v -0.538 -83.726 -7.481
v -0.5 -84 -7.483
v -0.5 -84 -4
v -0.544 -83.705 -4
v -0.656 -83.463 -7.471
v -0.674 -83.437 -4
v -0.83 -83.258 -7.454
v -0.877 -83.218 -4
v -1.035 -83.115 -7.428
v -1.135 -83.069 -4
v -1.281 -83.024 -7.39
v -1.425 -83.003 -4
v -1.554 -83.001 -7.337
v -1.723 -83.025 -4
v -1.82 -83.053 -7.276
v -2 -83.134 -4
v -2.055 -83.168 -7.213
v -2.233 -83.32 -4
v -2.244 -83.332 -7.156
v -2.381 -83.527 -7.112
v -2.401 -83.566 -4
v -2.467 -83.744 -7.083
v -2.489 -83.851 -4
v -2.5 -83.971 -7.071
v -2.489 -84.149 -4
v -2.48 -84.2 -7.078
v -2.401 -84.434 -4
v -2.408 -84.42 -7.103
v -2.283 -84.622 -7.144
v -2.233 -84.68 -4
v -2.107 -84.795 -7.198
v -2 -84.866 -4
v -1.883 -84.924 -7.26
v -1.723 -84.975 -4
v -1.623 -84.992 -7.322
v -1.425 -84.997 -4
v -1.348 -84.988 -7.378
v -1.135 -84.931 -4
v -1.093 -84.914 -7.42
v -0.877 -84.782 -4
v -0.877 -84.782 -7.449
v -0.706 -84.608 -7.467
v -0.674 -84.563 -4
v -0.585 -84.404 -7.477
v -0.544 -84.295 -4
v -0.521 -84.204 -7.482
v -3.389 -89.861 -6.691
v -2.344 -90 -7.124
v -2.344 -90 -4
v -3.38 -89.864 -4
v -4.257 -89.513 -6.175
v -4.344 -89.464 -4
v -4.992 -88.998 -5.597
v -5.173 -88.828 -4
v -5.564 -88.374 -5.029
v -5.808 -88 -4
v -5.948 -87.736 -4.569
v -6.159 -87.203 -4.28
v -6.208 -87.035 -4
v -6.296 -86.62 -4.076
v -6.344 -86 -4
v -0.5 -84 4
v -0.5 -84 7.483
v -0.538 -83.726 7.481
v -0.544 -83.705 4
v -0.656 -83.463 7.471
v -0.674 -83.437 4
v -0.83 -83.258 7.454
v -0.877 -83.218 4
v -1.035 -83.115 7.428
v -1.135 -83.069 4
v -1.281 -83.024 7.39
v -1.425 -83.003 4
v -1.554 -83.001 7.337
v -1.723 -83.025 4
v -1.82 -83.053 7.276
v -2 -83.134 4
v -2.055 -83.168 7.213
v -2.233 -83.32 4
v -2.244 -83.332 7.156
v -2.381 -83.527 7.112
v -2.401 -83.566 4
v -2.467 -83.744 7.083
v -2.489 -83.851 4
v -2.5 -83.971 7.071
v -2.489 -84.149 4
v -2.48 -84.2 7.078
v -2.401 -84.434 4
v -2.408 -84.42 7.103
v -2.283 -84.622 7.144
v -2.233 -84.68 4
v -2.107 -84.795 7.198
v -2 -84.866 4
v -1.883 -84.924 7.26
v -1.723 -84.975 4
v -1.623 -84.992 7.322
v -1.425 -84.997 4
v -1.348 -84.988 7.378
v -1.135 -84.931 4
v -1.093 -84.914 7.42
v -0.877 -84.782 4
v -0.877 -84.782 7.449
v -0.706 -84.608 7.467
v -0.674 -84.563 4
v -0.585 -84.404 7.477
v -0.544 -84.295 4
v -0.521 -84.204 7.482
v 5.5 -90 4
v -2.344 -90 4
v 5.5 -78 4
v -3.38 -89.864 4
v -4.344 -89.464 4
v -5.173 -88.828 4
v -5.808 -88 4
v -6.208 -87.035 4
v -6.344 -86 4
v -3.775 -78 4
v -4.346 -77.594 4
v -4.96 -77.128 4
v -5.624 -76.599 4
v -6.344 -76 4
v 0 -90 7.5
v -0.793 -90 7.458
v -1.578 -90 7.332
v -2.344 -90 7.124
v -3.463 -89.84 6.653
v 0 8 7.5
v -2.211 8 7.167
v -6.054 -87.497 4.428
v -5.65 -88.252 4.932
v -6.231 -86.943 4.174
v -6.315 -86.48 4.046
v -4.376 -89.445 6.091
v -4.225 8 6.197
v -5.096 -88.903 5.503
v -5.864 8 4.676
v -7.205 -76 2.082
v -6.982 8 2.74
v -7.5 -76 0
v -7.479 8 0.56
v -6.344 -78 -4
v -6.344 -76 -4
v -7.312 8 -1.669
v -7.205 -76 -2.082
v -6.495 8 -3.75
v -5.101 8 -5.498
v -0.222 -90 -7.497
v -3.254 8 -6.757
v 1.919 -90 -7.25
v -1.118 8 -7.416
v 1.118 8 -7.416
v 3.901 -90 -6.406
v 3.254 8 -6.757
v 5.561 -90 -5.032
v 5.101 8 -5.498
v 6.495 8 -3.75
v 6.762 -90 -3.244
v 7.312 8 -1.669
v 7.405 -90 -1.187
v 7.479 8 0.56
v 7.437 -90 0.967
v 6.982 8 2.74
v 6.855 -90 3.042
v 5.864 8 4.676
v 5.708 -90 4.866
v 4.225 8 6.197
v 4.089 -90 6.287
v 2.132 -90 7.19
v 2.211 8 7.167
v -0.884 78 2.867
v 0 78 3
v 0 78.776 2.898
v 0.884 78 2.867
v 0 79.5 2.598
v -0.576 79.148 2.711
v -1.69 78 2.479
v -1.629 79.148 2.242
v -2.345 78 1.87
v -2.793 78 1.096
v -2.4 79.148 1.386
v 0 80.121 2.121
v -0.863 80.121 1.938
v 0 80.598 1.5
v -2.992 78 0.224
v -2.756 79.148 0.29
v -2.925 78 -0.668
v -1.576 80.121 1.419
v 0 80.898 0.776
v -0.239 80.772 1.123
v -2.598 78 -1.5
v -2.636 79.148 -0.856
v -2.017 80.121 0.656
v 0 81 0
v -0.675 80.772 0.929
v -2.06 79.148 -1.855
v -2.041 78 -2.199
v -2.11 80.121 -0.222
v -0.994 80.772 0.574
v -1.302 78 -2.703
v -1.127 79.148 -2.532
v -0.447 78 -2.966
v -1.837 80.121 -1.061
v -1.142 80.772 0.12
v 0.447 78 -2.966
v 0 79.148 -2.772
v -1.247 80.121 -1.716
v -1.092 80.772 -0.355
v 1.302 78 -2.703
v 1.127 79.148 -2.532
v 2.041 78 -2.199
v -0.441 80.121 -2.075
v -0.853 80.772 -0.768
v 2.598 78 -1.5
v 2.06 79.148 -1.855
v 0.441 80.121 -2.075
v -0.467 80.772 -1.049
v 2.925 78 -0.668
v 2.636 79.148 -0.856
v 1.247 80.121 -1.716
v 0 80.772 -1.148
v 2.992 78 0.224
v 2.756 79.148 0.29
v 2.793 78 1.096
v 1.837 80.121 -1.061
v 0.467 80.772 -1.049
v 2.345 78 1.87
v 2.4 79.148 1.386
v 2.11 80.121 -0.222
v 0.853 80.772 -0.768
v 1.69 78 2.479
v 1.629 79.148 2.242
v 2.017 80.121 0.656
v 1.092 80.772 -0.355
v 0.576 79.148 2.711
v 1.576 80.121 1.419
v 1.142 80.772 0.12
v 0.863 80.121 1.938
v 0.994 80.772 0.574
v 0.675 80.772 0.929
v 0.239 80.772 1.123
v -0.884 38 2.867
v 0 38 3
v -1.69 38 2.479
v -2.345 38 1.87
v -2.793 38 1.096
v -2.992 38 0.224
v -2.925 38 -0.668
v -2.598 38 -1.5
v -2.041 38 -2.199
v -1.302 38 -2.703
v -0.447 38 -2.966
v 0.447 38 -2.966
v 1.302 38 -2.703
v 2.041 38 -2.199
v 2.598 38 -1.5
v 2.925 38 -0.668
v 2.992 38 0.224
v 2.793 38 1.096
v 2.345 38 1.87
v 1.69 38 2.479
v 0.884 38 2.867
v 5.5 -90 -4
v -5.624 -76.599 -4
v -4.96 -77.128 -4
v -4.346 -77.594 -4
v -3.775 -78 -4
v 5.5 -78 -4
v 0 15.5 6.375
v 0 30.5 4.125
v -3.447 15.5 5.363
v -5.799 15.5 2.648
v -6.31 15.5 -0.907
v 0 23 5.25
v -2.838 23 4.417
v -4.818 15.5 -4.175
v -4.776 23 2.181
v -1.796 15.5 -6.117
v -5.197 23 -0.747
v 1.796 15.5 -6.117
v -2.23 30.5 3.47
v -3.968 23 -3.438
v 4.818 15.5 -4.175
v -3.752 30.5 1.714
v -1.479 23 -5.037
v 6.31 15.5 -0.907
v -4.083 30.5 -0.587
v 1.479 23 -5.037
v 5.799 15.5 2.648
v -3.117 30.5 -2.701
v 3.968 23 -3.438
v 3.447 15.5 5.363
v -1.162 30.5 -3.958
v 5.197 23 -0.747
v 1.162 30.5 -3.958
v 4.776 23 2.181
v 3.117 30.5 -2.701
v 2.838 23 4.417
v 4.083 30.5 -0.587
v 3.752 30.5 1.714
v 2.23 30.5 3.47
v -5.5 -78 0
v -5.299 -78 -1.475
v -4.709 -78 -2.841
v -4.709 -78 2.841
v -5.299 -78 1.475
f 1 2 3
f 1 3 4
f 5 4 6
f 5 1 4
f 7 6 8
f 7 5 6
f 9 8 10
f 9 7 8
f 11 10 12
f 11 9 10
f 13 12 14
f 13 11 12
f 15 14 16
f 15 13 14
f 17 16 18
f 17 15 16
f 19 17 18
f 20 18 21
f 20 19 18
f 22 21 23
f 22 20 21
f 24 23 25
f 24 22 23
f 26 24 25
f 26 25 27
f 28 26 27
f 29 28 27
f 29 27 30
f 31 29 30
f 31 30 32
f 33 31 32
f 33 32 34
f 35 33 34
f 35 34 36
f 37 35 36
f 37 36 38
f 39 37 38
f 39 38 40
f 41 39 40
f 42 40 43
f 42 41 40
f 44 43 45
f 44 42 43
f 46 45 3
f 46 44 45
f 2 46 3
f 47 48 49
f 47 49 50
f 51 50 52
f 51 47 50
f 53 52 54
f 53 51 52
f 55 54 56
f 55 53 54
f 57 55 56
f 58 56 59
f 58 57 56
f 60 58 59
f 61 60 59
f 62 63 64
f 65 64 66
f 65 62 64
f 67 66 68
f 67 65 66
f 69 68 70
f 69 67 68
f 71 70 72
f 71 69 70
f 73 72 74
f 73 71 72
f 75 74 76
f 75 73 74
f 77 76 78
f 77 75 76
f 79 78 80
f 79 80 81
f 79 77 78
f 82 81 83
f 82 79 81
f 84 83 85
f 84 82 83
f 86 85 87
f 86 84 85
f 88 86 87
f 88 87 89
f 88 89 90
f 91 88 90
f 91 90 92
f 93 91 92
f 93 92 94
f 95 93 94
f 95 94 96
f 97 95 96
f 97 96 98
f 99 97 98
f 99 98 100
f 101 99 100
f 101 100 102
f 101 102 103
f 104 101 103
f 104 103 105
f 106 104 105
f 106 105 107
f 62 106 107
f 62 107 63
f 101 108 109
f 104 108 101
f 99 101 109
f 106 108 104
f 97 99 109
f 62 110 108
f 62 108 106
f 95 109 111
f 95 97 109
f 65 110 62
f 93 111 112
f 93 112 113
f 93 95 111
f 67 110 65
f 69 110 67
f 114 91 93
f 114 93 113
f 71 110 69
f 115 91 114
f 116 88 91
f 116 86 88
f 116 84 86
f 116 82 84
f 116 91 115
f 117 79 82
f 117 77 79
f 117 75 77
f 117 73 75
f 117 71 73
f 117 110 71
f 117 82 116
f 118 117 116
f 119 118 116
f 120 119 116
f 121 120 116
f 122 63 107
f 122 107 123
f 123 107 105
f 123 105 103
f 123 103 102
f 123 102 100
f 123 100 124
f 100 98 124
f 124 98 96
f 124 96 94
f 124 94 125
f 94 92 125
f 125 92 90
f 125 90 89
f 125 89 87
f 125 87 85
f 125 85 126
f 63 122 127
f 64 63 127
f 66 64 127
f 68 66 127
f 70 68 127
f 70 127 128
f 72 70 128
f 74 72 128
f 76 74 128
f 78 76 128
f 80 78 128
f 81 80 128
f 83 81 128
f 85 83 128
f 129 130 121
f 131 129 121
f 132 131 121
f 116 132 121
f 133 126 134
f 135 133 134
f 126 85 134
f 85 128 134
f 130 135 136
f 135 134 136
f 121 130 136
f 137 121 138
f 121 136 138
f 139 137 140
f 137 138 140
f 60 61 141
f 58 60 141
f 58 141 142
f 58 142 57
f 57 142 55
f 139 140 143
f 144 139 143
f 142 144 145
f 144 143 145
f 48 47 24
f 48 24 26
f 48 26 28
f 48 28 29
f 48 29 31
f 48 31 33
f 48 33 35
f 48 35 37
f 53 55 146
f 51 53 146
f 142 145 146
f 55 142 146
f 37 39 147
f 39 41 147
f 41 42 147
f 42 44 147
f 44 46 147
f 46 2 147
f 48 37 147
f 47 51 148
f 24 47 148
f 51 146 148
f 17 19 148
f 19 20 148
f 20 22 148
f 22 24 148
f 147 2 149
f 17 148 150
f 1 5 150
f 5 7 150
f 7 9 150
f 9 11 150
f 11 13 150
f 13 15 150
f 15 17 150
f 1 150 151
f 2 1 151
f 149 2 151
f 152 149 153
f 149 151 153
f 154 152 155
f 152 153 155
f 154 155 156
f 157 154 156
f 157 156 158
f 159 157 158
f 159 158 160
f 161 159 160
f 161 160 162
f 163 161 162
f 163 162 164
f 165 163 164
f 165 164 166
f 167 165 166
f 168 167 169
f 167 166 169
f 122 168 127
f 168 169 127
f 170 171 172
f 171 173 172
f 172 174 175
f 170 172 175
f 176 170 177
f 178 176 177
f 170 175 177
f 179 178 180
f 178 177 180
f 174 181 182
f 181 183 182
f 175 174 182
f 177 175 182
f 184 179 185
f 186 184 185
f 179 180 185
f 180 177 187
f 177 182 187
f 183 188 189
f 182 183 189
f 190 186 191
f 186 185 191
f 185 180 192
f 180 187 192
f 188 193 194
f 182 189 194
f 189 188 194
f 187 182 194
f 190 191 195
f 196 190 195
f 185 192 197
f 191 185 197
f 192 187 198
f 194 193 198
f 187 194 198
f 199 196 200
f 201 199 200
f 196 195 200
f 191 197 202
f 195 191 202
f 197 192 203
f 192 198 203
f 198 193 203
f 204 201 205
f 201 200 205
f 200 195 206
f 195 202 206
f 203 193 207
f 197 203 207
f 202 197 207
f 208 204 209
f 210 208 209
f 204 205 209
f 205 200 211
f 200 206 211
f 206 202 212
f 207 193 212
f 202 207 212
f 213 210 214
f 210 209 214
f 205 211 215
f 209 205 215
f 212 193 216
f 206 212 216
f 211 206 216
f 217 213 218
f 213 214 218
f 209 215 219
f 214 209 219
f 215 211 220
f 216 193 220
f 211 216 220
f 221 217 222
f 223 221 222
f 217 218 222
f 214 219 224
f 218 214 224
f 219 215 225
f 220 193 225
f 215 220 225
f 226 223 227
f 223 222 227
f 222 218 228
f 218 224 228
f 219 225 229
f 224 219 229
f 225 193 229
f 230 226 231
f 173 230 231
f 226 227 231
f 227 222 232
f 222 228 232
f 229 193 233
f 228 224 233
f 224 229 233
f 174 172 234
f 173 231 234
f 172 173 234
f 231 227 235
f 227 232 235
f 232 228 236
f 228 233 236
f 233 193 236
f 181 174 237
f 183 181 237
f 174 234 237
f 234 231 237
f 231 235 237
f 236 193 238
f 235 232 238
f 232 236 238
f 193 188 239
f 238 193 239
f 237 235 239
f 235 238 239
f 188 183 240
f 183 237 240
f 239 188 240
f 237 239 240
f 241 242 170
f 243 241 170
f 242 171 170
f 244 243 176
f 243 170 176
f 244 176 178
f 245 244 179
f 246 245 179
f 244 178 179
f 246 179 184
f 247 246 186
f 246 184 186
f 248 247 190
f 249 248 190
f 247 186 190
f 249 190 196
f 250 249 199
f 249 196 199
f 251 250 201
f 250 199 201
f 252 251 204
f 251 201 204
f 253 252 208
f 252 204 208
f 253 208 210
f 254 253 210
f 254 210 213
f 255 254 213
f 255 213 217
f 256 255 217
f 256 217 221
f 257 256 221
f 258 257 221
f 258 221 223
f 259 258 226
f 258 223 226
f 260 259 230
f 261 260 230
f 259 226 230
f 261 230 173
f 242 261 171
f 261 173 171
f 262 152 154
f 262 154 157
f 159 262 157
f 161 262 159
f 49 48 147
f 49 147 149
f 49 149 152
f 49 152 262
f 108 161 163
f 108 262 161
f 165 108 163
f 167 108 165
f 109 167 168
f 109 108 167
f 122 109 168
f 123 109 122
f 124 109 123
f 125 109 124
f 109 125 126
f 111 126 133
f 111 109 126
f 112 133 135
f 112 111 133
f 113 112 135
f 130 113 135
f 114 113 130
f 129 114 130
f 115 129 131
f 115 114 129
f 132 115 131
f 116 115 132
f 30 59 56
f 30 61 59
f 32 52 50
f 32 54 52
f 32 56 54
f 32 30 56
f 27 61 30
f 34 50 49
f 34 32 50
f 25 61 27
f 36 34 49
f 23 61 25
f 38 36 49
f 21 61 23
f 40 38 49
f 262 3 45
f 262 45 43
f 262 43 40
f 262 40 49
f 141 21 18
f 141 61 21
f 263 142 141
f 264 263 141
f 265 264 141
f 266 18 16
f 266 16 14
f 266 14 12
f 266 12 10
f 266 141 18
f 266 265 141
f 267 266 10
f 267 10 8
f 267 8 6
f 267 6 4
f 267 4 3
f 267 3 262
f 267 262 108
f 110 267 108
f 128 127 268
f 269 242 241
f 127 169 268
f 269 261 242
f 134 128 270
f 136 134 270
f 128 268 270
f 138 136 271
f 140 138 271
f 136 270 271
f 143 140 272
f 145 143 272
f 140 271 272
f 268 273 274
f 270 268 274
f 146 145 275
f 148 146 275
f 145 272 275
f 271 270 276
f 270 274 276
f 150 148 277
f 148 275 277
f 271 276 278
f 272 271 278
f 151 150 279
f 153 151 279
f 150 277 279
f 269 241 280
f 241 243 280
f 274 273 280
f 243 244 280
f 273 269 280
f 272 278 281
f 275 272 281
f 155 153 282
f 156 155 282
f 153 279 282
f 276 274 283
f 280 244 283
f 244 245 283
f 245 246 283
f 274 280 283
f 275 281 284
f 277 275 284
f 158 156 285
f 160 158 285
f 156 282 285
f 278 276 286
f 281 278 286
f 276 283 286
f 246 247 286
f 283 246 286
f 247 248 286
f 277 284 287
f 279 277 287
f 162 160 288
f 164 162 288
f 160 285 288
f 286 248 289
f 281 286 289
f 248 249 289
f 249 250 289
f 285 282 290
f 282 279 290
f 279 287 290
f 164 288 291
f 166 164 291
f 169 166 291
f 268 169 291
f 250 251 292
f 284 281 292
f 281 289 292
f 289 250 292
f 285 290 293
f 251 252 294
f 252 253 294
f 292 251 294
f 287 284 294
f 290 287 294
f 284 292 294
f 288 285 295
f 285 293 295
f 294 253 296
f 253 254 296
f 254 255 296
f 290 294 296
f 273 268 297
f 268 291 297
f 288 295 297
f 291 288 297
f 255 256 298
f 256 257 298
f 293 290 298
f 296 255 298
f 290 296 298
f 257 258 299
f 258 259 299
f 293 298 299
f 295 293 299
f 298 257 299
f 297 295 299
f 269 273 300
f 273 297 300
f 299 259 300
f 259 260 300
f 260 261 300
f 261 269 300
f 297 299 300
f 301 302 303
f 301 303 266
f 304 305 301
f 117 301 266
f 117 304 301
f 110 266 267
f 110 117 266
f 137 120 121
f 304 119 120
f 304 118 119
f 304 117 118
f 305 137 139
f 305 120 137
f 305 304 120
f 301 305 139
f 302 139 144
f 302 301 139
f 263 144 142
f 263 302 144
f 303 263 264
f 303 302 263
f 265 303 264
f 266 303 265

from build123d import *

# Parameters (mm, degrees)
SKETCH3_R               = 7.5
BOSS_EXTRUDE1_DEPTH     = 18
CUT_EXTRUDE1_START      = -12
CUT_EXTRUDE1_DEPTH      = 12
CHAMFER1_SIZE           = 2
CUT_EXTRUDE2_DEPTH      = 92.041199465
CUT_EXTRUDE2_DEPTH_BACK = 92.041199465
CUT_EXTRUDE3_DEPTH      = 92.041199585
CUT_EXTRUDE3_DEPTH_BACK = 92.041199585
SKETCH7_R               = 1


with BuildPart() as part:
    # Sketch2 → Revolve1 (revolve)
    with BuildSketch(Plane.XY, mode=Mode.PRIVATE) as revolve1_sk:
        with BuildLine():
            Line((7.5, -72), (7.5, 8))
            Line((7.5, 8), (3, 38))
            Line((3, 38), (3, 78))
            ThreePointArc((3, 78), (2.121320344, 80.121320344), (0, 81))
            Line((0, 81), (0, -72))
            Line((0, -72), (7.5, -72))
        make_face()
    revolve(revolve1_sk.sketch.rotate(Axis((0, 81, 0), (0, -1, 0)), 90), axis=Axis((0, 81, 0), (0, -1, 0)))

    # Sketch3 → Boss-Extrude1 (add)
    with BuildSketch(Plane.XZ.offset(72)):
        with Locations(Location((0, 0, 0), (0, 0, 90))):
            Circle(SKETCH3_R)
    extrude(amount=BOSS_EXTRUDE1_DEPTH)

    # Sketch4 → Cut-Extrude1 (cut)
    with BuildSketch(Plane.XZ.offset(90).offset(CUT_EXTRUDE1_START)):
        with BuildLine():
            Line((5.5, 4), (-6.34428877, 4))
            ThreePointArc((-6.34428877, 4), (-7.5, 0), (-6.34428877, -4))
            Line((-6.34428877, -4), (5.5, -4))
            Line((5.5, -4), (5.5, -0.585443259))
            Line((5.5, -0.585443259), (5.5, 0.585443259))
            Line((5.5, 0.585443259), (5.5, 4))
        make_face()
    extrude(amount=CUT_EXTRUDE1_DEPTH, mode=Mode.SUBTRACT)

    # Chamfer1
    chamfer1_edges = [part.edges().sort_by_distance(p)[0] for p in [
        (-7.5, -78, 0),
    ]]
    chamfer(chamfer1_edges, length=CHAMFER1_SIZE)

    # Sketch6 → Cut-Extrude2 (cut, two sides: drawn at the far end of the back side and taken through both)
    with BuildSketch(Plane.XY.offset(-4).offset(-CUT_EXTRUDE2_DEPTH_BACK)):
        with BuildLine():
            Line((-6.34428877, -86), (-6.34428877, -90))
            Line((-6.34428877, -90), (-2.34428877, -90))
            ThreePointArc((-2.34428877, -90), (-5.172715895, -88.828427125), (-6.34428877, -86))
        make_face()
    extrude(amount=CUT_EXTRUDE2_DEPTH + CUT_EXTRUDE2_DEPTH_BACK, mode=Mode.SUBTRACT)

    # Sketch7 → Cut-Extrude3 (cut, two sides: drawn at the far end of the back side and taken through both)
    with BuildSketch(Plane.XY.offset(-4).offset(-CUT_EXTRUDE3_DEPTH_BACK)):
        with Locations((-1.5, -84)):
            Circle(SKETCH7_R)
    extrude(amount=CUT_EXTRUDE3_DEPTH + CUT_EXTRUDE3_DEPTH_BACK, mode=Mode.SUBTRACT)


solid = part.part
